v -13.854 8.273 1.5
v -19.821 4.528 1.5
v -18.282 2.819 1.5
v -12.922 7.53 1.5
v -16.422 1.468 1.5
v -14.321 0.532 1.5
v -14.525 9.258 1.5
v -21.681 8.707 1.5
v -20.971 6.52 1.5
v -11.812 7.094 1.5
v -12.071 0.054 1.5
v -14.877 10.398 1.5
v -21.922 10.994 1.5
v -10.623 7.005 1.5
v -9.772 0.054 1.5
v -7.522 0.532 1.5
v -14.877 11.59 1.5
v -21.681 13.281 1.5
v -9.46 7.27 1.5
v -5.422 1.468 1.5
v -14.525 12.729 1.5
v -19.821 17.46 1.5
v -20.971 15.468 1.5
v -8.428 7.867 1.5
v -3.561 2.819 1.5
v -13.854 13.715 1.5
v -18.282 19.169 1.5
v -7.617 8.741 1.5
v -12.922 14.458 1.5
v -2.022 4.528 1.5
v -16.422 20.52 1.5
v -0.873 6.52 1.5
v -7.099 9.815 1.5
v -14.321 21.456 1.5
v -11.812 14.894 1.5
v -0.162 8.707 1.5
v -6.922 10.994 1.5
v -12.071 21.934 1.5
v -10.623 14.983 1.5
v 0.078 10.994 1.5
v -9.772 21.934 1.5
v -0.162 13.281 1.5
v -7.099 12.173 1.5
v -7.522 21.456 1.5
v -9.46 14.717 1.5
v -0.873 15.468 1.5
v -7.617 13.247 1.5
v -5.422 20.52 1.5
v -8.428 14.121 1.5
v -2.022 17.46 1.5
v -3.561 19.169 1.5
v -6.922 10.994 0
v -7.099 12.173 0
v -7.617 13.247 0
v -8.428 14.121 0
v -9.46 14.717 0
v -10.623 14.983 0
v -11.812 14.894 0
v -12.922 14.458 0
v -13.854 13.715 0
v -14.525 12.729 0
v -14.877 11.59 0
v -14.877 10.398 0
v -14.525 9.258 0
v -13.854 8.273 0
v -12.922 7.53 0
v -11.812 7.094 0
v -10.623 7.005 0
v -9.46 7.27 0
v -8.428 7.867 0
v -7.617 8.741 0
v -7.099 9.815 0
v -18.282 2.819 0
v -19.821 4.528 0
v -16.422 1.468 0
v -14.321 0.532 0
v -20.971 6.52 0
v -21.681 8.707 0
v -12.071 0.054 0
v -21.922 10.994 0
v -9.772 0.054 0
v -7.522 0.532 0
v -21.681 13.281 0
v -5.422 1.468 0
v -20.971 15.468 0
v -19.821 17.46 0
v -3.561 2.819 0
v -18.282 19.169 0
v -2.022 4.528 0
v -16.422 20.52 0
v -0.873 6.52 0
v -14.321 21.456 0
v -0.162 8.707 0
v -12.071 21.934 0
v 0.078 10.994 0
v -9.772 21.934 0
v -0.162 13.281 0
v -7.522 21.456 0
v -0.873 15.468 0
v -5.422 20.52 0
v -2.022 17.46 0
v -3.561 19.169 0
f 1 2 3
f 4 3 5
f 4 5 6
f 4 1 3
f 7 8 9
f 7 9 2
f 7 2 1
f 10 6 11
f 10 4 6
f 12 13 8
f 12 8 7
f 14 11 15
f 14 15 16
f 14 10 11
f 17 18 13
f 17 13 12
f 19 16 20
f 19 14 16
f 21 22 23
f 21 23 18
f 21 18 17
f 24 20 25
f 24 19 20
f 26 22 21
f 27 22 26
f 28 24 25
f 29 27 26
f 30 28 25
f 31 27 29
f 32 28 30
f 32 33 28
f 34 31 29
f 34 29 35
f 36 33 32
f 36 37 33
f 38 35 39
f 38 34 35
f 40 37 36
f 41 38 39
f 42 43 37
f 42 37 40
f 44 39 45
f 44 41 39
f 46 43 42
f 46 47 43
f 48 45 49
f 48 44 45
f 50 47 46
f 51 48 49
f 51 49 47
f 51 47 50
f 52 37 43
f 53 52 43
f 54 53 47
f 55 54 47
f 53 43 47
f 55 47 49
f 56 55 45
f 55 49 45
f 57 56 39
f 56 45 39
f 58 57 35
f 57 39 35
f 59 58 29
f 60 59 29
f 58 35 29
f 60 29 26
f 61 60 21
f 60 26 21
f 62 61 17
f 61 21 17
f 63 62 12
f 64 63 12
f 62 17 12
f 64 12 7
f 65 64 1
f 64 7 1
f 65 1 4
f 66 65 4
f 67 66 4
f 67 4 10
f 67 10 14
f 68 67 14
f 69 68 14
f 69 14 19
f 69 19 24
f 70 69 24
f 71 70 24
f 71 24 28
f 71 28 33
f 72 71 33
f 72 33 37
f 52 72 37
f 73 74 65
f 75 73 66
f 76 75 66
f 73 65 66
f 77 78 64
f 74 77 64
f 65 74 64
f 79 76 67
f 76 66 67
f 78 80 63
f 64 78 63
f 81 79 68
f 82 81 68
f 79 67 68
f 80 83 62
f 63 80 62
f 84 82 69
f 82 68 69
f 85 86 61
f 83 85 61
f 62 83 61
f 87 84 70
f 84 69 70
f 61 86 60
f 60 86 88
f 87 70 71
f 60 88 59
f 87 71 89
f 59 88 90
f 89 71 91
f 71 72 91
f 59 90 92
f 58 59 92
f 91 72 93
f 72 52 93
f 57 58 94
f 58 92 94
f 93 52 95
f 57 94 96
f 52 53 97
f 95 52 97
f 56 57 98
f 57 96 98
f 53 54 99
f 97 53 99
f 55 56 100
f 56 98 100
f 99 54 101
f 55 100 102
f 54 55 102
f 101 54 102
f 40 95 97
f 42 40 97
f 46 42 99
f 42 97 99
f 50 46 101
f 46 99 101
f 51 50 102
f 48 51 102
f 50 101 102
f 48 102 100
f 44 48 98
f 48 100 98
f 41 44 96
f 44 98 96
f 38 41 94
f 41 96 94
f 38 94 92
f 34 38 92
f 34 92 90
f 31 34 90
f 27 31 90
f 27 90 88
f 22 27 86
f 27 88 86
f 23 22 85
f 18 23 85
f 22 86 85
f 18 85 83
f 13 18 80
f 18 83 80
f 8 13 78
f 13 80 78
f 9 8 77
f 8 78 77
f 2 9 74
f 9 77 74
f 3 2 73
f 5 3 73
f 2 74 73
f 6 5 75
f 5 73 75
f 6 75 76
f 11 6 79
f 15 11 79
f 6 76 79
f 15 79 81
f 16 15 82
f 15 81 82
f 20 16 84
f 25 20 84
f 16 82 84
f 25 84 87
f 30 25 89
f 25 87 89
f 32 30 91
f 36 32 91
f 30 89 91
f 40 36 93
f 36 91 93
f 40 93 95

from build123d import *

# Parameters (mm, degrees)
F0_R     = 11
F1_DEPTH = 1.5
F2_R     = 4
F3_DEPTH = 25


with BuildPart() as f1:
    # F0 (on Top) → F1 (new body)
    with BuildSketch(Plane.XY):
        with Locations((-33.321586, 31.793948)):
            Circle(F0_R)
    extrude(amount=F1_DEPTH)

    # F2 (on face) → F3 (cut)
    with BuildSketch(Plane.XY.offset(1.5)):
        with Locations((-33.321586, 31.793948)):
            Circle(F2_R)
    extrude(amount=-F3_DEPTH, mode=Mode.SUBTRACT)


with BuildPart() as f1_1:
    # F4: moved
    add(f1.part.moved(Location((22.4, -20.8, 0))))


solid = f1_1.part
